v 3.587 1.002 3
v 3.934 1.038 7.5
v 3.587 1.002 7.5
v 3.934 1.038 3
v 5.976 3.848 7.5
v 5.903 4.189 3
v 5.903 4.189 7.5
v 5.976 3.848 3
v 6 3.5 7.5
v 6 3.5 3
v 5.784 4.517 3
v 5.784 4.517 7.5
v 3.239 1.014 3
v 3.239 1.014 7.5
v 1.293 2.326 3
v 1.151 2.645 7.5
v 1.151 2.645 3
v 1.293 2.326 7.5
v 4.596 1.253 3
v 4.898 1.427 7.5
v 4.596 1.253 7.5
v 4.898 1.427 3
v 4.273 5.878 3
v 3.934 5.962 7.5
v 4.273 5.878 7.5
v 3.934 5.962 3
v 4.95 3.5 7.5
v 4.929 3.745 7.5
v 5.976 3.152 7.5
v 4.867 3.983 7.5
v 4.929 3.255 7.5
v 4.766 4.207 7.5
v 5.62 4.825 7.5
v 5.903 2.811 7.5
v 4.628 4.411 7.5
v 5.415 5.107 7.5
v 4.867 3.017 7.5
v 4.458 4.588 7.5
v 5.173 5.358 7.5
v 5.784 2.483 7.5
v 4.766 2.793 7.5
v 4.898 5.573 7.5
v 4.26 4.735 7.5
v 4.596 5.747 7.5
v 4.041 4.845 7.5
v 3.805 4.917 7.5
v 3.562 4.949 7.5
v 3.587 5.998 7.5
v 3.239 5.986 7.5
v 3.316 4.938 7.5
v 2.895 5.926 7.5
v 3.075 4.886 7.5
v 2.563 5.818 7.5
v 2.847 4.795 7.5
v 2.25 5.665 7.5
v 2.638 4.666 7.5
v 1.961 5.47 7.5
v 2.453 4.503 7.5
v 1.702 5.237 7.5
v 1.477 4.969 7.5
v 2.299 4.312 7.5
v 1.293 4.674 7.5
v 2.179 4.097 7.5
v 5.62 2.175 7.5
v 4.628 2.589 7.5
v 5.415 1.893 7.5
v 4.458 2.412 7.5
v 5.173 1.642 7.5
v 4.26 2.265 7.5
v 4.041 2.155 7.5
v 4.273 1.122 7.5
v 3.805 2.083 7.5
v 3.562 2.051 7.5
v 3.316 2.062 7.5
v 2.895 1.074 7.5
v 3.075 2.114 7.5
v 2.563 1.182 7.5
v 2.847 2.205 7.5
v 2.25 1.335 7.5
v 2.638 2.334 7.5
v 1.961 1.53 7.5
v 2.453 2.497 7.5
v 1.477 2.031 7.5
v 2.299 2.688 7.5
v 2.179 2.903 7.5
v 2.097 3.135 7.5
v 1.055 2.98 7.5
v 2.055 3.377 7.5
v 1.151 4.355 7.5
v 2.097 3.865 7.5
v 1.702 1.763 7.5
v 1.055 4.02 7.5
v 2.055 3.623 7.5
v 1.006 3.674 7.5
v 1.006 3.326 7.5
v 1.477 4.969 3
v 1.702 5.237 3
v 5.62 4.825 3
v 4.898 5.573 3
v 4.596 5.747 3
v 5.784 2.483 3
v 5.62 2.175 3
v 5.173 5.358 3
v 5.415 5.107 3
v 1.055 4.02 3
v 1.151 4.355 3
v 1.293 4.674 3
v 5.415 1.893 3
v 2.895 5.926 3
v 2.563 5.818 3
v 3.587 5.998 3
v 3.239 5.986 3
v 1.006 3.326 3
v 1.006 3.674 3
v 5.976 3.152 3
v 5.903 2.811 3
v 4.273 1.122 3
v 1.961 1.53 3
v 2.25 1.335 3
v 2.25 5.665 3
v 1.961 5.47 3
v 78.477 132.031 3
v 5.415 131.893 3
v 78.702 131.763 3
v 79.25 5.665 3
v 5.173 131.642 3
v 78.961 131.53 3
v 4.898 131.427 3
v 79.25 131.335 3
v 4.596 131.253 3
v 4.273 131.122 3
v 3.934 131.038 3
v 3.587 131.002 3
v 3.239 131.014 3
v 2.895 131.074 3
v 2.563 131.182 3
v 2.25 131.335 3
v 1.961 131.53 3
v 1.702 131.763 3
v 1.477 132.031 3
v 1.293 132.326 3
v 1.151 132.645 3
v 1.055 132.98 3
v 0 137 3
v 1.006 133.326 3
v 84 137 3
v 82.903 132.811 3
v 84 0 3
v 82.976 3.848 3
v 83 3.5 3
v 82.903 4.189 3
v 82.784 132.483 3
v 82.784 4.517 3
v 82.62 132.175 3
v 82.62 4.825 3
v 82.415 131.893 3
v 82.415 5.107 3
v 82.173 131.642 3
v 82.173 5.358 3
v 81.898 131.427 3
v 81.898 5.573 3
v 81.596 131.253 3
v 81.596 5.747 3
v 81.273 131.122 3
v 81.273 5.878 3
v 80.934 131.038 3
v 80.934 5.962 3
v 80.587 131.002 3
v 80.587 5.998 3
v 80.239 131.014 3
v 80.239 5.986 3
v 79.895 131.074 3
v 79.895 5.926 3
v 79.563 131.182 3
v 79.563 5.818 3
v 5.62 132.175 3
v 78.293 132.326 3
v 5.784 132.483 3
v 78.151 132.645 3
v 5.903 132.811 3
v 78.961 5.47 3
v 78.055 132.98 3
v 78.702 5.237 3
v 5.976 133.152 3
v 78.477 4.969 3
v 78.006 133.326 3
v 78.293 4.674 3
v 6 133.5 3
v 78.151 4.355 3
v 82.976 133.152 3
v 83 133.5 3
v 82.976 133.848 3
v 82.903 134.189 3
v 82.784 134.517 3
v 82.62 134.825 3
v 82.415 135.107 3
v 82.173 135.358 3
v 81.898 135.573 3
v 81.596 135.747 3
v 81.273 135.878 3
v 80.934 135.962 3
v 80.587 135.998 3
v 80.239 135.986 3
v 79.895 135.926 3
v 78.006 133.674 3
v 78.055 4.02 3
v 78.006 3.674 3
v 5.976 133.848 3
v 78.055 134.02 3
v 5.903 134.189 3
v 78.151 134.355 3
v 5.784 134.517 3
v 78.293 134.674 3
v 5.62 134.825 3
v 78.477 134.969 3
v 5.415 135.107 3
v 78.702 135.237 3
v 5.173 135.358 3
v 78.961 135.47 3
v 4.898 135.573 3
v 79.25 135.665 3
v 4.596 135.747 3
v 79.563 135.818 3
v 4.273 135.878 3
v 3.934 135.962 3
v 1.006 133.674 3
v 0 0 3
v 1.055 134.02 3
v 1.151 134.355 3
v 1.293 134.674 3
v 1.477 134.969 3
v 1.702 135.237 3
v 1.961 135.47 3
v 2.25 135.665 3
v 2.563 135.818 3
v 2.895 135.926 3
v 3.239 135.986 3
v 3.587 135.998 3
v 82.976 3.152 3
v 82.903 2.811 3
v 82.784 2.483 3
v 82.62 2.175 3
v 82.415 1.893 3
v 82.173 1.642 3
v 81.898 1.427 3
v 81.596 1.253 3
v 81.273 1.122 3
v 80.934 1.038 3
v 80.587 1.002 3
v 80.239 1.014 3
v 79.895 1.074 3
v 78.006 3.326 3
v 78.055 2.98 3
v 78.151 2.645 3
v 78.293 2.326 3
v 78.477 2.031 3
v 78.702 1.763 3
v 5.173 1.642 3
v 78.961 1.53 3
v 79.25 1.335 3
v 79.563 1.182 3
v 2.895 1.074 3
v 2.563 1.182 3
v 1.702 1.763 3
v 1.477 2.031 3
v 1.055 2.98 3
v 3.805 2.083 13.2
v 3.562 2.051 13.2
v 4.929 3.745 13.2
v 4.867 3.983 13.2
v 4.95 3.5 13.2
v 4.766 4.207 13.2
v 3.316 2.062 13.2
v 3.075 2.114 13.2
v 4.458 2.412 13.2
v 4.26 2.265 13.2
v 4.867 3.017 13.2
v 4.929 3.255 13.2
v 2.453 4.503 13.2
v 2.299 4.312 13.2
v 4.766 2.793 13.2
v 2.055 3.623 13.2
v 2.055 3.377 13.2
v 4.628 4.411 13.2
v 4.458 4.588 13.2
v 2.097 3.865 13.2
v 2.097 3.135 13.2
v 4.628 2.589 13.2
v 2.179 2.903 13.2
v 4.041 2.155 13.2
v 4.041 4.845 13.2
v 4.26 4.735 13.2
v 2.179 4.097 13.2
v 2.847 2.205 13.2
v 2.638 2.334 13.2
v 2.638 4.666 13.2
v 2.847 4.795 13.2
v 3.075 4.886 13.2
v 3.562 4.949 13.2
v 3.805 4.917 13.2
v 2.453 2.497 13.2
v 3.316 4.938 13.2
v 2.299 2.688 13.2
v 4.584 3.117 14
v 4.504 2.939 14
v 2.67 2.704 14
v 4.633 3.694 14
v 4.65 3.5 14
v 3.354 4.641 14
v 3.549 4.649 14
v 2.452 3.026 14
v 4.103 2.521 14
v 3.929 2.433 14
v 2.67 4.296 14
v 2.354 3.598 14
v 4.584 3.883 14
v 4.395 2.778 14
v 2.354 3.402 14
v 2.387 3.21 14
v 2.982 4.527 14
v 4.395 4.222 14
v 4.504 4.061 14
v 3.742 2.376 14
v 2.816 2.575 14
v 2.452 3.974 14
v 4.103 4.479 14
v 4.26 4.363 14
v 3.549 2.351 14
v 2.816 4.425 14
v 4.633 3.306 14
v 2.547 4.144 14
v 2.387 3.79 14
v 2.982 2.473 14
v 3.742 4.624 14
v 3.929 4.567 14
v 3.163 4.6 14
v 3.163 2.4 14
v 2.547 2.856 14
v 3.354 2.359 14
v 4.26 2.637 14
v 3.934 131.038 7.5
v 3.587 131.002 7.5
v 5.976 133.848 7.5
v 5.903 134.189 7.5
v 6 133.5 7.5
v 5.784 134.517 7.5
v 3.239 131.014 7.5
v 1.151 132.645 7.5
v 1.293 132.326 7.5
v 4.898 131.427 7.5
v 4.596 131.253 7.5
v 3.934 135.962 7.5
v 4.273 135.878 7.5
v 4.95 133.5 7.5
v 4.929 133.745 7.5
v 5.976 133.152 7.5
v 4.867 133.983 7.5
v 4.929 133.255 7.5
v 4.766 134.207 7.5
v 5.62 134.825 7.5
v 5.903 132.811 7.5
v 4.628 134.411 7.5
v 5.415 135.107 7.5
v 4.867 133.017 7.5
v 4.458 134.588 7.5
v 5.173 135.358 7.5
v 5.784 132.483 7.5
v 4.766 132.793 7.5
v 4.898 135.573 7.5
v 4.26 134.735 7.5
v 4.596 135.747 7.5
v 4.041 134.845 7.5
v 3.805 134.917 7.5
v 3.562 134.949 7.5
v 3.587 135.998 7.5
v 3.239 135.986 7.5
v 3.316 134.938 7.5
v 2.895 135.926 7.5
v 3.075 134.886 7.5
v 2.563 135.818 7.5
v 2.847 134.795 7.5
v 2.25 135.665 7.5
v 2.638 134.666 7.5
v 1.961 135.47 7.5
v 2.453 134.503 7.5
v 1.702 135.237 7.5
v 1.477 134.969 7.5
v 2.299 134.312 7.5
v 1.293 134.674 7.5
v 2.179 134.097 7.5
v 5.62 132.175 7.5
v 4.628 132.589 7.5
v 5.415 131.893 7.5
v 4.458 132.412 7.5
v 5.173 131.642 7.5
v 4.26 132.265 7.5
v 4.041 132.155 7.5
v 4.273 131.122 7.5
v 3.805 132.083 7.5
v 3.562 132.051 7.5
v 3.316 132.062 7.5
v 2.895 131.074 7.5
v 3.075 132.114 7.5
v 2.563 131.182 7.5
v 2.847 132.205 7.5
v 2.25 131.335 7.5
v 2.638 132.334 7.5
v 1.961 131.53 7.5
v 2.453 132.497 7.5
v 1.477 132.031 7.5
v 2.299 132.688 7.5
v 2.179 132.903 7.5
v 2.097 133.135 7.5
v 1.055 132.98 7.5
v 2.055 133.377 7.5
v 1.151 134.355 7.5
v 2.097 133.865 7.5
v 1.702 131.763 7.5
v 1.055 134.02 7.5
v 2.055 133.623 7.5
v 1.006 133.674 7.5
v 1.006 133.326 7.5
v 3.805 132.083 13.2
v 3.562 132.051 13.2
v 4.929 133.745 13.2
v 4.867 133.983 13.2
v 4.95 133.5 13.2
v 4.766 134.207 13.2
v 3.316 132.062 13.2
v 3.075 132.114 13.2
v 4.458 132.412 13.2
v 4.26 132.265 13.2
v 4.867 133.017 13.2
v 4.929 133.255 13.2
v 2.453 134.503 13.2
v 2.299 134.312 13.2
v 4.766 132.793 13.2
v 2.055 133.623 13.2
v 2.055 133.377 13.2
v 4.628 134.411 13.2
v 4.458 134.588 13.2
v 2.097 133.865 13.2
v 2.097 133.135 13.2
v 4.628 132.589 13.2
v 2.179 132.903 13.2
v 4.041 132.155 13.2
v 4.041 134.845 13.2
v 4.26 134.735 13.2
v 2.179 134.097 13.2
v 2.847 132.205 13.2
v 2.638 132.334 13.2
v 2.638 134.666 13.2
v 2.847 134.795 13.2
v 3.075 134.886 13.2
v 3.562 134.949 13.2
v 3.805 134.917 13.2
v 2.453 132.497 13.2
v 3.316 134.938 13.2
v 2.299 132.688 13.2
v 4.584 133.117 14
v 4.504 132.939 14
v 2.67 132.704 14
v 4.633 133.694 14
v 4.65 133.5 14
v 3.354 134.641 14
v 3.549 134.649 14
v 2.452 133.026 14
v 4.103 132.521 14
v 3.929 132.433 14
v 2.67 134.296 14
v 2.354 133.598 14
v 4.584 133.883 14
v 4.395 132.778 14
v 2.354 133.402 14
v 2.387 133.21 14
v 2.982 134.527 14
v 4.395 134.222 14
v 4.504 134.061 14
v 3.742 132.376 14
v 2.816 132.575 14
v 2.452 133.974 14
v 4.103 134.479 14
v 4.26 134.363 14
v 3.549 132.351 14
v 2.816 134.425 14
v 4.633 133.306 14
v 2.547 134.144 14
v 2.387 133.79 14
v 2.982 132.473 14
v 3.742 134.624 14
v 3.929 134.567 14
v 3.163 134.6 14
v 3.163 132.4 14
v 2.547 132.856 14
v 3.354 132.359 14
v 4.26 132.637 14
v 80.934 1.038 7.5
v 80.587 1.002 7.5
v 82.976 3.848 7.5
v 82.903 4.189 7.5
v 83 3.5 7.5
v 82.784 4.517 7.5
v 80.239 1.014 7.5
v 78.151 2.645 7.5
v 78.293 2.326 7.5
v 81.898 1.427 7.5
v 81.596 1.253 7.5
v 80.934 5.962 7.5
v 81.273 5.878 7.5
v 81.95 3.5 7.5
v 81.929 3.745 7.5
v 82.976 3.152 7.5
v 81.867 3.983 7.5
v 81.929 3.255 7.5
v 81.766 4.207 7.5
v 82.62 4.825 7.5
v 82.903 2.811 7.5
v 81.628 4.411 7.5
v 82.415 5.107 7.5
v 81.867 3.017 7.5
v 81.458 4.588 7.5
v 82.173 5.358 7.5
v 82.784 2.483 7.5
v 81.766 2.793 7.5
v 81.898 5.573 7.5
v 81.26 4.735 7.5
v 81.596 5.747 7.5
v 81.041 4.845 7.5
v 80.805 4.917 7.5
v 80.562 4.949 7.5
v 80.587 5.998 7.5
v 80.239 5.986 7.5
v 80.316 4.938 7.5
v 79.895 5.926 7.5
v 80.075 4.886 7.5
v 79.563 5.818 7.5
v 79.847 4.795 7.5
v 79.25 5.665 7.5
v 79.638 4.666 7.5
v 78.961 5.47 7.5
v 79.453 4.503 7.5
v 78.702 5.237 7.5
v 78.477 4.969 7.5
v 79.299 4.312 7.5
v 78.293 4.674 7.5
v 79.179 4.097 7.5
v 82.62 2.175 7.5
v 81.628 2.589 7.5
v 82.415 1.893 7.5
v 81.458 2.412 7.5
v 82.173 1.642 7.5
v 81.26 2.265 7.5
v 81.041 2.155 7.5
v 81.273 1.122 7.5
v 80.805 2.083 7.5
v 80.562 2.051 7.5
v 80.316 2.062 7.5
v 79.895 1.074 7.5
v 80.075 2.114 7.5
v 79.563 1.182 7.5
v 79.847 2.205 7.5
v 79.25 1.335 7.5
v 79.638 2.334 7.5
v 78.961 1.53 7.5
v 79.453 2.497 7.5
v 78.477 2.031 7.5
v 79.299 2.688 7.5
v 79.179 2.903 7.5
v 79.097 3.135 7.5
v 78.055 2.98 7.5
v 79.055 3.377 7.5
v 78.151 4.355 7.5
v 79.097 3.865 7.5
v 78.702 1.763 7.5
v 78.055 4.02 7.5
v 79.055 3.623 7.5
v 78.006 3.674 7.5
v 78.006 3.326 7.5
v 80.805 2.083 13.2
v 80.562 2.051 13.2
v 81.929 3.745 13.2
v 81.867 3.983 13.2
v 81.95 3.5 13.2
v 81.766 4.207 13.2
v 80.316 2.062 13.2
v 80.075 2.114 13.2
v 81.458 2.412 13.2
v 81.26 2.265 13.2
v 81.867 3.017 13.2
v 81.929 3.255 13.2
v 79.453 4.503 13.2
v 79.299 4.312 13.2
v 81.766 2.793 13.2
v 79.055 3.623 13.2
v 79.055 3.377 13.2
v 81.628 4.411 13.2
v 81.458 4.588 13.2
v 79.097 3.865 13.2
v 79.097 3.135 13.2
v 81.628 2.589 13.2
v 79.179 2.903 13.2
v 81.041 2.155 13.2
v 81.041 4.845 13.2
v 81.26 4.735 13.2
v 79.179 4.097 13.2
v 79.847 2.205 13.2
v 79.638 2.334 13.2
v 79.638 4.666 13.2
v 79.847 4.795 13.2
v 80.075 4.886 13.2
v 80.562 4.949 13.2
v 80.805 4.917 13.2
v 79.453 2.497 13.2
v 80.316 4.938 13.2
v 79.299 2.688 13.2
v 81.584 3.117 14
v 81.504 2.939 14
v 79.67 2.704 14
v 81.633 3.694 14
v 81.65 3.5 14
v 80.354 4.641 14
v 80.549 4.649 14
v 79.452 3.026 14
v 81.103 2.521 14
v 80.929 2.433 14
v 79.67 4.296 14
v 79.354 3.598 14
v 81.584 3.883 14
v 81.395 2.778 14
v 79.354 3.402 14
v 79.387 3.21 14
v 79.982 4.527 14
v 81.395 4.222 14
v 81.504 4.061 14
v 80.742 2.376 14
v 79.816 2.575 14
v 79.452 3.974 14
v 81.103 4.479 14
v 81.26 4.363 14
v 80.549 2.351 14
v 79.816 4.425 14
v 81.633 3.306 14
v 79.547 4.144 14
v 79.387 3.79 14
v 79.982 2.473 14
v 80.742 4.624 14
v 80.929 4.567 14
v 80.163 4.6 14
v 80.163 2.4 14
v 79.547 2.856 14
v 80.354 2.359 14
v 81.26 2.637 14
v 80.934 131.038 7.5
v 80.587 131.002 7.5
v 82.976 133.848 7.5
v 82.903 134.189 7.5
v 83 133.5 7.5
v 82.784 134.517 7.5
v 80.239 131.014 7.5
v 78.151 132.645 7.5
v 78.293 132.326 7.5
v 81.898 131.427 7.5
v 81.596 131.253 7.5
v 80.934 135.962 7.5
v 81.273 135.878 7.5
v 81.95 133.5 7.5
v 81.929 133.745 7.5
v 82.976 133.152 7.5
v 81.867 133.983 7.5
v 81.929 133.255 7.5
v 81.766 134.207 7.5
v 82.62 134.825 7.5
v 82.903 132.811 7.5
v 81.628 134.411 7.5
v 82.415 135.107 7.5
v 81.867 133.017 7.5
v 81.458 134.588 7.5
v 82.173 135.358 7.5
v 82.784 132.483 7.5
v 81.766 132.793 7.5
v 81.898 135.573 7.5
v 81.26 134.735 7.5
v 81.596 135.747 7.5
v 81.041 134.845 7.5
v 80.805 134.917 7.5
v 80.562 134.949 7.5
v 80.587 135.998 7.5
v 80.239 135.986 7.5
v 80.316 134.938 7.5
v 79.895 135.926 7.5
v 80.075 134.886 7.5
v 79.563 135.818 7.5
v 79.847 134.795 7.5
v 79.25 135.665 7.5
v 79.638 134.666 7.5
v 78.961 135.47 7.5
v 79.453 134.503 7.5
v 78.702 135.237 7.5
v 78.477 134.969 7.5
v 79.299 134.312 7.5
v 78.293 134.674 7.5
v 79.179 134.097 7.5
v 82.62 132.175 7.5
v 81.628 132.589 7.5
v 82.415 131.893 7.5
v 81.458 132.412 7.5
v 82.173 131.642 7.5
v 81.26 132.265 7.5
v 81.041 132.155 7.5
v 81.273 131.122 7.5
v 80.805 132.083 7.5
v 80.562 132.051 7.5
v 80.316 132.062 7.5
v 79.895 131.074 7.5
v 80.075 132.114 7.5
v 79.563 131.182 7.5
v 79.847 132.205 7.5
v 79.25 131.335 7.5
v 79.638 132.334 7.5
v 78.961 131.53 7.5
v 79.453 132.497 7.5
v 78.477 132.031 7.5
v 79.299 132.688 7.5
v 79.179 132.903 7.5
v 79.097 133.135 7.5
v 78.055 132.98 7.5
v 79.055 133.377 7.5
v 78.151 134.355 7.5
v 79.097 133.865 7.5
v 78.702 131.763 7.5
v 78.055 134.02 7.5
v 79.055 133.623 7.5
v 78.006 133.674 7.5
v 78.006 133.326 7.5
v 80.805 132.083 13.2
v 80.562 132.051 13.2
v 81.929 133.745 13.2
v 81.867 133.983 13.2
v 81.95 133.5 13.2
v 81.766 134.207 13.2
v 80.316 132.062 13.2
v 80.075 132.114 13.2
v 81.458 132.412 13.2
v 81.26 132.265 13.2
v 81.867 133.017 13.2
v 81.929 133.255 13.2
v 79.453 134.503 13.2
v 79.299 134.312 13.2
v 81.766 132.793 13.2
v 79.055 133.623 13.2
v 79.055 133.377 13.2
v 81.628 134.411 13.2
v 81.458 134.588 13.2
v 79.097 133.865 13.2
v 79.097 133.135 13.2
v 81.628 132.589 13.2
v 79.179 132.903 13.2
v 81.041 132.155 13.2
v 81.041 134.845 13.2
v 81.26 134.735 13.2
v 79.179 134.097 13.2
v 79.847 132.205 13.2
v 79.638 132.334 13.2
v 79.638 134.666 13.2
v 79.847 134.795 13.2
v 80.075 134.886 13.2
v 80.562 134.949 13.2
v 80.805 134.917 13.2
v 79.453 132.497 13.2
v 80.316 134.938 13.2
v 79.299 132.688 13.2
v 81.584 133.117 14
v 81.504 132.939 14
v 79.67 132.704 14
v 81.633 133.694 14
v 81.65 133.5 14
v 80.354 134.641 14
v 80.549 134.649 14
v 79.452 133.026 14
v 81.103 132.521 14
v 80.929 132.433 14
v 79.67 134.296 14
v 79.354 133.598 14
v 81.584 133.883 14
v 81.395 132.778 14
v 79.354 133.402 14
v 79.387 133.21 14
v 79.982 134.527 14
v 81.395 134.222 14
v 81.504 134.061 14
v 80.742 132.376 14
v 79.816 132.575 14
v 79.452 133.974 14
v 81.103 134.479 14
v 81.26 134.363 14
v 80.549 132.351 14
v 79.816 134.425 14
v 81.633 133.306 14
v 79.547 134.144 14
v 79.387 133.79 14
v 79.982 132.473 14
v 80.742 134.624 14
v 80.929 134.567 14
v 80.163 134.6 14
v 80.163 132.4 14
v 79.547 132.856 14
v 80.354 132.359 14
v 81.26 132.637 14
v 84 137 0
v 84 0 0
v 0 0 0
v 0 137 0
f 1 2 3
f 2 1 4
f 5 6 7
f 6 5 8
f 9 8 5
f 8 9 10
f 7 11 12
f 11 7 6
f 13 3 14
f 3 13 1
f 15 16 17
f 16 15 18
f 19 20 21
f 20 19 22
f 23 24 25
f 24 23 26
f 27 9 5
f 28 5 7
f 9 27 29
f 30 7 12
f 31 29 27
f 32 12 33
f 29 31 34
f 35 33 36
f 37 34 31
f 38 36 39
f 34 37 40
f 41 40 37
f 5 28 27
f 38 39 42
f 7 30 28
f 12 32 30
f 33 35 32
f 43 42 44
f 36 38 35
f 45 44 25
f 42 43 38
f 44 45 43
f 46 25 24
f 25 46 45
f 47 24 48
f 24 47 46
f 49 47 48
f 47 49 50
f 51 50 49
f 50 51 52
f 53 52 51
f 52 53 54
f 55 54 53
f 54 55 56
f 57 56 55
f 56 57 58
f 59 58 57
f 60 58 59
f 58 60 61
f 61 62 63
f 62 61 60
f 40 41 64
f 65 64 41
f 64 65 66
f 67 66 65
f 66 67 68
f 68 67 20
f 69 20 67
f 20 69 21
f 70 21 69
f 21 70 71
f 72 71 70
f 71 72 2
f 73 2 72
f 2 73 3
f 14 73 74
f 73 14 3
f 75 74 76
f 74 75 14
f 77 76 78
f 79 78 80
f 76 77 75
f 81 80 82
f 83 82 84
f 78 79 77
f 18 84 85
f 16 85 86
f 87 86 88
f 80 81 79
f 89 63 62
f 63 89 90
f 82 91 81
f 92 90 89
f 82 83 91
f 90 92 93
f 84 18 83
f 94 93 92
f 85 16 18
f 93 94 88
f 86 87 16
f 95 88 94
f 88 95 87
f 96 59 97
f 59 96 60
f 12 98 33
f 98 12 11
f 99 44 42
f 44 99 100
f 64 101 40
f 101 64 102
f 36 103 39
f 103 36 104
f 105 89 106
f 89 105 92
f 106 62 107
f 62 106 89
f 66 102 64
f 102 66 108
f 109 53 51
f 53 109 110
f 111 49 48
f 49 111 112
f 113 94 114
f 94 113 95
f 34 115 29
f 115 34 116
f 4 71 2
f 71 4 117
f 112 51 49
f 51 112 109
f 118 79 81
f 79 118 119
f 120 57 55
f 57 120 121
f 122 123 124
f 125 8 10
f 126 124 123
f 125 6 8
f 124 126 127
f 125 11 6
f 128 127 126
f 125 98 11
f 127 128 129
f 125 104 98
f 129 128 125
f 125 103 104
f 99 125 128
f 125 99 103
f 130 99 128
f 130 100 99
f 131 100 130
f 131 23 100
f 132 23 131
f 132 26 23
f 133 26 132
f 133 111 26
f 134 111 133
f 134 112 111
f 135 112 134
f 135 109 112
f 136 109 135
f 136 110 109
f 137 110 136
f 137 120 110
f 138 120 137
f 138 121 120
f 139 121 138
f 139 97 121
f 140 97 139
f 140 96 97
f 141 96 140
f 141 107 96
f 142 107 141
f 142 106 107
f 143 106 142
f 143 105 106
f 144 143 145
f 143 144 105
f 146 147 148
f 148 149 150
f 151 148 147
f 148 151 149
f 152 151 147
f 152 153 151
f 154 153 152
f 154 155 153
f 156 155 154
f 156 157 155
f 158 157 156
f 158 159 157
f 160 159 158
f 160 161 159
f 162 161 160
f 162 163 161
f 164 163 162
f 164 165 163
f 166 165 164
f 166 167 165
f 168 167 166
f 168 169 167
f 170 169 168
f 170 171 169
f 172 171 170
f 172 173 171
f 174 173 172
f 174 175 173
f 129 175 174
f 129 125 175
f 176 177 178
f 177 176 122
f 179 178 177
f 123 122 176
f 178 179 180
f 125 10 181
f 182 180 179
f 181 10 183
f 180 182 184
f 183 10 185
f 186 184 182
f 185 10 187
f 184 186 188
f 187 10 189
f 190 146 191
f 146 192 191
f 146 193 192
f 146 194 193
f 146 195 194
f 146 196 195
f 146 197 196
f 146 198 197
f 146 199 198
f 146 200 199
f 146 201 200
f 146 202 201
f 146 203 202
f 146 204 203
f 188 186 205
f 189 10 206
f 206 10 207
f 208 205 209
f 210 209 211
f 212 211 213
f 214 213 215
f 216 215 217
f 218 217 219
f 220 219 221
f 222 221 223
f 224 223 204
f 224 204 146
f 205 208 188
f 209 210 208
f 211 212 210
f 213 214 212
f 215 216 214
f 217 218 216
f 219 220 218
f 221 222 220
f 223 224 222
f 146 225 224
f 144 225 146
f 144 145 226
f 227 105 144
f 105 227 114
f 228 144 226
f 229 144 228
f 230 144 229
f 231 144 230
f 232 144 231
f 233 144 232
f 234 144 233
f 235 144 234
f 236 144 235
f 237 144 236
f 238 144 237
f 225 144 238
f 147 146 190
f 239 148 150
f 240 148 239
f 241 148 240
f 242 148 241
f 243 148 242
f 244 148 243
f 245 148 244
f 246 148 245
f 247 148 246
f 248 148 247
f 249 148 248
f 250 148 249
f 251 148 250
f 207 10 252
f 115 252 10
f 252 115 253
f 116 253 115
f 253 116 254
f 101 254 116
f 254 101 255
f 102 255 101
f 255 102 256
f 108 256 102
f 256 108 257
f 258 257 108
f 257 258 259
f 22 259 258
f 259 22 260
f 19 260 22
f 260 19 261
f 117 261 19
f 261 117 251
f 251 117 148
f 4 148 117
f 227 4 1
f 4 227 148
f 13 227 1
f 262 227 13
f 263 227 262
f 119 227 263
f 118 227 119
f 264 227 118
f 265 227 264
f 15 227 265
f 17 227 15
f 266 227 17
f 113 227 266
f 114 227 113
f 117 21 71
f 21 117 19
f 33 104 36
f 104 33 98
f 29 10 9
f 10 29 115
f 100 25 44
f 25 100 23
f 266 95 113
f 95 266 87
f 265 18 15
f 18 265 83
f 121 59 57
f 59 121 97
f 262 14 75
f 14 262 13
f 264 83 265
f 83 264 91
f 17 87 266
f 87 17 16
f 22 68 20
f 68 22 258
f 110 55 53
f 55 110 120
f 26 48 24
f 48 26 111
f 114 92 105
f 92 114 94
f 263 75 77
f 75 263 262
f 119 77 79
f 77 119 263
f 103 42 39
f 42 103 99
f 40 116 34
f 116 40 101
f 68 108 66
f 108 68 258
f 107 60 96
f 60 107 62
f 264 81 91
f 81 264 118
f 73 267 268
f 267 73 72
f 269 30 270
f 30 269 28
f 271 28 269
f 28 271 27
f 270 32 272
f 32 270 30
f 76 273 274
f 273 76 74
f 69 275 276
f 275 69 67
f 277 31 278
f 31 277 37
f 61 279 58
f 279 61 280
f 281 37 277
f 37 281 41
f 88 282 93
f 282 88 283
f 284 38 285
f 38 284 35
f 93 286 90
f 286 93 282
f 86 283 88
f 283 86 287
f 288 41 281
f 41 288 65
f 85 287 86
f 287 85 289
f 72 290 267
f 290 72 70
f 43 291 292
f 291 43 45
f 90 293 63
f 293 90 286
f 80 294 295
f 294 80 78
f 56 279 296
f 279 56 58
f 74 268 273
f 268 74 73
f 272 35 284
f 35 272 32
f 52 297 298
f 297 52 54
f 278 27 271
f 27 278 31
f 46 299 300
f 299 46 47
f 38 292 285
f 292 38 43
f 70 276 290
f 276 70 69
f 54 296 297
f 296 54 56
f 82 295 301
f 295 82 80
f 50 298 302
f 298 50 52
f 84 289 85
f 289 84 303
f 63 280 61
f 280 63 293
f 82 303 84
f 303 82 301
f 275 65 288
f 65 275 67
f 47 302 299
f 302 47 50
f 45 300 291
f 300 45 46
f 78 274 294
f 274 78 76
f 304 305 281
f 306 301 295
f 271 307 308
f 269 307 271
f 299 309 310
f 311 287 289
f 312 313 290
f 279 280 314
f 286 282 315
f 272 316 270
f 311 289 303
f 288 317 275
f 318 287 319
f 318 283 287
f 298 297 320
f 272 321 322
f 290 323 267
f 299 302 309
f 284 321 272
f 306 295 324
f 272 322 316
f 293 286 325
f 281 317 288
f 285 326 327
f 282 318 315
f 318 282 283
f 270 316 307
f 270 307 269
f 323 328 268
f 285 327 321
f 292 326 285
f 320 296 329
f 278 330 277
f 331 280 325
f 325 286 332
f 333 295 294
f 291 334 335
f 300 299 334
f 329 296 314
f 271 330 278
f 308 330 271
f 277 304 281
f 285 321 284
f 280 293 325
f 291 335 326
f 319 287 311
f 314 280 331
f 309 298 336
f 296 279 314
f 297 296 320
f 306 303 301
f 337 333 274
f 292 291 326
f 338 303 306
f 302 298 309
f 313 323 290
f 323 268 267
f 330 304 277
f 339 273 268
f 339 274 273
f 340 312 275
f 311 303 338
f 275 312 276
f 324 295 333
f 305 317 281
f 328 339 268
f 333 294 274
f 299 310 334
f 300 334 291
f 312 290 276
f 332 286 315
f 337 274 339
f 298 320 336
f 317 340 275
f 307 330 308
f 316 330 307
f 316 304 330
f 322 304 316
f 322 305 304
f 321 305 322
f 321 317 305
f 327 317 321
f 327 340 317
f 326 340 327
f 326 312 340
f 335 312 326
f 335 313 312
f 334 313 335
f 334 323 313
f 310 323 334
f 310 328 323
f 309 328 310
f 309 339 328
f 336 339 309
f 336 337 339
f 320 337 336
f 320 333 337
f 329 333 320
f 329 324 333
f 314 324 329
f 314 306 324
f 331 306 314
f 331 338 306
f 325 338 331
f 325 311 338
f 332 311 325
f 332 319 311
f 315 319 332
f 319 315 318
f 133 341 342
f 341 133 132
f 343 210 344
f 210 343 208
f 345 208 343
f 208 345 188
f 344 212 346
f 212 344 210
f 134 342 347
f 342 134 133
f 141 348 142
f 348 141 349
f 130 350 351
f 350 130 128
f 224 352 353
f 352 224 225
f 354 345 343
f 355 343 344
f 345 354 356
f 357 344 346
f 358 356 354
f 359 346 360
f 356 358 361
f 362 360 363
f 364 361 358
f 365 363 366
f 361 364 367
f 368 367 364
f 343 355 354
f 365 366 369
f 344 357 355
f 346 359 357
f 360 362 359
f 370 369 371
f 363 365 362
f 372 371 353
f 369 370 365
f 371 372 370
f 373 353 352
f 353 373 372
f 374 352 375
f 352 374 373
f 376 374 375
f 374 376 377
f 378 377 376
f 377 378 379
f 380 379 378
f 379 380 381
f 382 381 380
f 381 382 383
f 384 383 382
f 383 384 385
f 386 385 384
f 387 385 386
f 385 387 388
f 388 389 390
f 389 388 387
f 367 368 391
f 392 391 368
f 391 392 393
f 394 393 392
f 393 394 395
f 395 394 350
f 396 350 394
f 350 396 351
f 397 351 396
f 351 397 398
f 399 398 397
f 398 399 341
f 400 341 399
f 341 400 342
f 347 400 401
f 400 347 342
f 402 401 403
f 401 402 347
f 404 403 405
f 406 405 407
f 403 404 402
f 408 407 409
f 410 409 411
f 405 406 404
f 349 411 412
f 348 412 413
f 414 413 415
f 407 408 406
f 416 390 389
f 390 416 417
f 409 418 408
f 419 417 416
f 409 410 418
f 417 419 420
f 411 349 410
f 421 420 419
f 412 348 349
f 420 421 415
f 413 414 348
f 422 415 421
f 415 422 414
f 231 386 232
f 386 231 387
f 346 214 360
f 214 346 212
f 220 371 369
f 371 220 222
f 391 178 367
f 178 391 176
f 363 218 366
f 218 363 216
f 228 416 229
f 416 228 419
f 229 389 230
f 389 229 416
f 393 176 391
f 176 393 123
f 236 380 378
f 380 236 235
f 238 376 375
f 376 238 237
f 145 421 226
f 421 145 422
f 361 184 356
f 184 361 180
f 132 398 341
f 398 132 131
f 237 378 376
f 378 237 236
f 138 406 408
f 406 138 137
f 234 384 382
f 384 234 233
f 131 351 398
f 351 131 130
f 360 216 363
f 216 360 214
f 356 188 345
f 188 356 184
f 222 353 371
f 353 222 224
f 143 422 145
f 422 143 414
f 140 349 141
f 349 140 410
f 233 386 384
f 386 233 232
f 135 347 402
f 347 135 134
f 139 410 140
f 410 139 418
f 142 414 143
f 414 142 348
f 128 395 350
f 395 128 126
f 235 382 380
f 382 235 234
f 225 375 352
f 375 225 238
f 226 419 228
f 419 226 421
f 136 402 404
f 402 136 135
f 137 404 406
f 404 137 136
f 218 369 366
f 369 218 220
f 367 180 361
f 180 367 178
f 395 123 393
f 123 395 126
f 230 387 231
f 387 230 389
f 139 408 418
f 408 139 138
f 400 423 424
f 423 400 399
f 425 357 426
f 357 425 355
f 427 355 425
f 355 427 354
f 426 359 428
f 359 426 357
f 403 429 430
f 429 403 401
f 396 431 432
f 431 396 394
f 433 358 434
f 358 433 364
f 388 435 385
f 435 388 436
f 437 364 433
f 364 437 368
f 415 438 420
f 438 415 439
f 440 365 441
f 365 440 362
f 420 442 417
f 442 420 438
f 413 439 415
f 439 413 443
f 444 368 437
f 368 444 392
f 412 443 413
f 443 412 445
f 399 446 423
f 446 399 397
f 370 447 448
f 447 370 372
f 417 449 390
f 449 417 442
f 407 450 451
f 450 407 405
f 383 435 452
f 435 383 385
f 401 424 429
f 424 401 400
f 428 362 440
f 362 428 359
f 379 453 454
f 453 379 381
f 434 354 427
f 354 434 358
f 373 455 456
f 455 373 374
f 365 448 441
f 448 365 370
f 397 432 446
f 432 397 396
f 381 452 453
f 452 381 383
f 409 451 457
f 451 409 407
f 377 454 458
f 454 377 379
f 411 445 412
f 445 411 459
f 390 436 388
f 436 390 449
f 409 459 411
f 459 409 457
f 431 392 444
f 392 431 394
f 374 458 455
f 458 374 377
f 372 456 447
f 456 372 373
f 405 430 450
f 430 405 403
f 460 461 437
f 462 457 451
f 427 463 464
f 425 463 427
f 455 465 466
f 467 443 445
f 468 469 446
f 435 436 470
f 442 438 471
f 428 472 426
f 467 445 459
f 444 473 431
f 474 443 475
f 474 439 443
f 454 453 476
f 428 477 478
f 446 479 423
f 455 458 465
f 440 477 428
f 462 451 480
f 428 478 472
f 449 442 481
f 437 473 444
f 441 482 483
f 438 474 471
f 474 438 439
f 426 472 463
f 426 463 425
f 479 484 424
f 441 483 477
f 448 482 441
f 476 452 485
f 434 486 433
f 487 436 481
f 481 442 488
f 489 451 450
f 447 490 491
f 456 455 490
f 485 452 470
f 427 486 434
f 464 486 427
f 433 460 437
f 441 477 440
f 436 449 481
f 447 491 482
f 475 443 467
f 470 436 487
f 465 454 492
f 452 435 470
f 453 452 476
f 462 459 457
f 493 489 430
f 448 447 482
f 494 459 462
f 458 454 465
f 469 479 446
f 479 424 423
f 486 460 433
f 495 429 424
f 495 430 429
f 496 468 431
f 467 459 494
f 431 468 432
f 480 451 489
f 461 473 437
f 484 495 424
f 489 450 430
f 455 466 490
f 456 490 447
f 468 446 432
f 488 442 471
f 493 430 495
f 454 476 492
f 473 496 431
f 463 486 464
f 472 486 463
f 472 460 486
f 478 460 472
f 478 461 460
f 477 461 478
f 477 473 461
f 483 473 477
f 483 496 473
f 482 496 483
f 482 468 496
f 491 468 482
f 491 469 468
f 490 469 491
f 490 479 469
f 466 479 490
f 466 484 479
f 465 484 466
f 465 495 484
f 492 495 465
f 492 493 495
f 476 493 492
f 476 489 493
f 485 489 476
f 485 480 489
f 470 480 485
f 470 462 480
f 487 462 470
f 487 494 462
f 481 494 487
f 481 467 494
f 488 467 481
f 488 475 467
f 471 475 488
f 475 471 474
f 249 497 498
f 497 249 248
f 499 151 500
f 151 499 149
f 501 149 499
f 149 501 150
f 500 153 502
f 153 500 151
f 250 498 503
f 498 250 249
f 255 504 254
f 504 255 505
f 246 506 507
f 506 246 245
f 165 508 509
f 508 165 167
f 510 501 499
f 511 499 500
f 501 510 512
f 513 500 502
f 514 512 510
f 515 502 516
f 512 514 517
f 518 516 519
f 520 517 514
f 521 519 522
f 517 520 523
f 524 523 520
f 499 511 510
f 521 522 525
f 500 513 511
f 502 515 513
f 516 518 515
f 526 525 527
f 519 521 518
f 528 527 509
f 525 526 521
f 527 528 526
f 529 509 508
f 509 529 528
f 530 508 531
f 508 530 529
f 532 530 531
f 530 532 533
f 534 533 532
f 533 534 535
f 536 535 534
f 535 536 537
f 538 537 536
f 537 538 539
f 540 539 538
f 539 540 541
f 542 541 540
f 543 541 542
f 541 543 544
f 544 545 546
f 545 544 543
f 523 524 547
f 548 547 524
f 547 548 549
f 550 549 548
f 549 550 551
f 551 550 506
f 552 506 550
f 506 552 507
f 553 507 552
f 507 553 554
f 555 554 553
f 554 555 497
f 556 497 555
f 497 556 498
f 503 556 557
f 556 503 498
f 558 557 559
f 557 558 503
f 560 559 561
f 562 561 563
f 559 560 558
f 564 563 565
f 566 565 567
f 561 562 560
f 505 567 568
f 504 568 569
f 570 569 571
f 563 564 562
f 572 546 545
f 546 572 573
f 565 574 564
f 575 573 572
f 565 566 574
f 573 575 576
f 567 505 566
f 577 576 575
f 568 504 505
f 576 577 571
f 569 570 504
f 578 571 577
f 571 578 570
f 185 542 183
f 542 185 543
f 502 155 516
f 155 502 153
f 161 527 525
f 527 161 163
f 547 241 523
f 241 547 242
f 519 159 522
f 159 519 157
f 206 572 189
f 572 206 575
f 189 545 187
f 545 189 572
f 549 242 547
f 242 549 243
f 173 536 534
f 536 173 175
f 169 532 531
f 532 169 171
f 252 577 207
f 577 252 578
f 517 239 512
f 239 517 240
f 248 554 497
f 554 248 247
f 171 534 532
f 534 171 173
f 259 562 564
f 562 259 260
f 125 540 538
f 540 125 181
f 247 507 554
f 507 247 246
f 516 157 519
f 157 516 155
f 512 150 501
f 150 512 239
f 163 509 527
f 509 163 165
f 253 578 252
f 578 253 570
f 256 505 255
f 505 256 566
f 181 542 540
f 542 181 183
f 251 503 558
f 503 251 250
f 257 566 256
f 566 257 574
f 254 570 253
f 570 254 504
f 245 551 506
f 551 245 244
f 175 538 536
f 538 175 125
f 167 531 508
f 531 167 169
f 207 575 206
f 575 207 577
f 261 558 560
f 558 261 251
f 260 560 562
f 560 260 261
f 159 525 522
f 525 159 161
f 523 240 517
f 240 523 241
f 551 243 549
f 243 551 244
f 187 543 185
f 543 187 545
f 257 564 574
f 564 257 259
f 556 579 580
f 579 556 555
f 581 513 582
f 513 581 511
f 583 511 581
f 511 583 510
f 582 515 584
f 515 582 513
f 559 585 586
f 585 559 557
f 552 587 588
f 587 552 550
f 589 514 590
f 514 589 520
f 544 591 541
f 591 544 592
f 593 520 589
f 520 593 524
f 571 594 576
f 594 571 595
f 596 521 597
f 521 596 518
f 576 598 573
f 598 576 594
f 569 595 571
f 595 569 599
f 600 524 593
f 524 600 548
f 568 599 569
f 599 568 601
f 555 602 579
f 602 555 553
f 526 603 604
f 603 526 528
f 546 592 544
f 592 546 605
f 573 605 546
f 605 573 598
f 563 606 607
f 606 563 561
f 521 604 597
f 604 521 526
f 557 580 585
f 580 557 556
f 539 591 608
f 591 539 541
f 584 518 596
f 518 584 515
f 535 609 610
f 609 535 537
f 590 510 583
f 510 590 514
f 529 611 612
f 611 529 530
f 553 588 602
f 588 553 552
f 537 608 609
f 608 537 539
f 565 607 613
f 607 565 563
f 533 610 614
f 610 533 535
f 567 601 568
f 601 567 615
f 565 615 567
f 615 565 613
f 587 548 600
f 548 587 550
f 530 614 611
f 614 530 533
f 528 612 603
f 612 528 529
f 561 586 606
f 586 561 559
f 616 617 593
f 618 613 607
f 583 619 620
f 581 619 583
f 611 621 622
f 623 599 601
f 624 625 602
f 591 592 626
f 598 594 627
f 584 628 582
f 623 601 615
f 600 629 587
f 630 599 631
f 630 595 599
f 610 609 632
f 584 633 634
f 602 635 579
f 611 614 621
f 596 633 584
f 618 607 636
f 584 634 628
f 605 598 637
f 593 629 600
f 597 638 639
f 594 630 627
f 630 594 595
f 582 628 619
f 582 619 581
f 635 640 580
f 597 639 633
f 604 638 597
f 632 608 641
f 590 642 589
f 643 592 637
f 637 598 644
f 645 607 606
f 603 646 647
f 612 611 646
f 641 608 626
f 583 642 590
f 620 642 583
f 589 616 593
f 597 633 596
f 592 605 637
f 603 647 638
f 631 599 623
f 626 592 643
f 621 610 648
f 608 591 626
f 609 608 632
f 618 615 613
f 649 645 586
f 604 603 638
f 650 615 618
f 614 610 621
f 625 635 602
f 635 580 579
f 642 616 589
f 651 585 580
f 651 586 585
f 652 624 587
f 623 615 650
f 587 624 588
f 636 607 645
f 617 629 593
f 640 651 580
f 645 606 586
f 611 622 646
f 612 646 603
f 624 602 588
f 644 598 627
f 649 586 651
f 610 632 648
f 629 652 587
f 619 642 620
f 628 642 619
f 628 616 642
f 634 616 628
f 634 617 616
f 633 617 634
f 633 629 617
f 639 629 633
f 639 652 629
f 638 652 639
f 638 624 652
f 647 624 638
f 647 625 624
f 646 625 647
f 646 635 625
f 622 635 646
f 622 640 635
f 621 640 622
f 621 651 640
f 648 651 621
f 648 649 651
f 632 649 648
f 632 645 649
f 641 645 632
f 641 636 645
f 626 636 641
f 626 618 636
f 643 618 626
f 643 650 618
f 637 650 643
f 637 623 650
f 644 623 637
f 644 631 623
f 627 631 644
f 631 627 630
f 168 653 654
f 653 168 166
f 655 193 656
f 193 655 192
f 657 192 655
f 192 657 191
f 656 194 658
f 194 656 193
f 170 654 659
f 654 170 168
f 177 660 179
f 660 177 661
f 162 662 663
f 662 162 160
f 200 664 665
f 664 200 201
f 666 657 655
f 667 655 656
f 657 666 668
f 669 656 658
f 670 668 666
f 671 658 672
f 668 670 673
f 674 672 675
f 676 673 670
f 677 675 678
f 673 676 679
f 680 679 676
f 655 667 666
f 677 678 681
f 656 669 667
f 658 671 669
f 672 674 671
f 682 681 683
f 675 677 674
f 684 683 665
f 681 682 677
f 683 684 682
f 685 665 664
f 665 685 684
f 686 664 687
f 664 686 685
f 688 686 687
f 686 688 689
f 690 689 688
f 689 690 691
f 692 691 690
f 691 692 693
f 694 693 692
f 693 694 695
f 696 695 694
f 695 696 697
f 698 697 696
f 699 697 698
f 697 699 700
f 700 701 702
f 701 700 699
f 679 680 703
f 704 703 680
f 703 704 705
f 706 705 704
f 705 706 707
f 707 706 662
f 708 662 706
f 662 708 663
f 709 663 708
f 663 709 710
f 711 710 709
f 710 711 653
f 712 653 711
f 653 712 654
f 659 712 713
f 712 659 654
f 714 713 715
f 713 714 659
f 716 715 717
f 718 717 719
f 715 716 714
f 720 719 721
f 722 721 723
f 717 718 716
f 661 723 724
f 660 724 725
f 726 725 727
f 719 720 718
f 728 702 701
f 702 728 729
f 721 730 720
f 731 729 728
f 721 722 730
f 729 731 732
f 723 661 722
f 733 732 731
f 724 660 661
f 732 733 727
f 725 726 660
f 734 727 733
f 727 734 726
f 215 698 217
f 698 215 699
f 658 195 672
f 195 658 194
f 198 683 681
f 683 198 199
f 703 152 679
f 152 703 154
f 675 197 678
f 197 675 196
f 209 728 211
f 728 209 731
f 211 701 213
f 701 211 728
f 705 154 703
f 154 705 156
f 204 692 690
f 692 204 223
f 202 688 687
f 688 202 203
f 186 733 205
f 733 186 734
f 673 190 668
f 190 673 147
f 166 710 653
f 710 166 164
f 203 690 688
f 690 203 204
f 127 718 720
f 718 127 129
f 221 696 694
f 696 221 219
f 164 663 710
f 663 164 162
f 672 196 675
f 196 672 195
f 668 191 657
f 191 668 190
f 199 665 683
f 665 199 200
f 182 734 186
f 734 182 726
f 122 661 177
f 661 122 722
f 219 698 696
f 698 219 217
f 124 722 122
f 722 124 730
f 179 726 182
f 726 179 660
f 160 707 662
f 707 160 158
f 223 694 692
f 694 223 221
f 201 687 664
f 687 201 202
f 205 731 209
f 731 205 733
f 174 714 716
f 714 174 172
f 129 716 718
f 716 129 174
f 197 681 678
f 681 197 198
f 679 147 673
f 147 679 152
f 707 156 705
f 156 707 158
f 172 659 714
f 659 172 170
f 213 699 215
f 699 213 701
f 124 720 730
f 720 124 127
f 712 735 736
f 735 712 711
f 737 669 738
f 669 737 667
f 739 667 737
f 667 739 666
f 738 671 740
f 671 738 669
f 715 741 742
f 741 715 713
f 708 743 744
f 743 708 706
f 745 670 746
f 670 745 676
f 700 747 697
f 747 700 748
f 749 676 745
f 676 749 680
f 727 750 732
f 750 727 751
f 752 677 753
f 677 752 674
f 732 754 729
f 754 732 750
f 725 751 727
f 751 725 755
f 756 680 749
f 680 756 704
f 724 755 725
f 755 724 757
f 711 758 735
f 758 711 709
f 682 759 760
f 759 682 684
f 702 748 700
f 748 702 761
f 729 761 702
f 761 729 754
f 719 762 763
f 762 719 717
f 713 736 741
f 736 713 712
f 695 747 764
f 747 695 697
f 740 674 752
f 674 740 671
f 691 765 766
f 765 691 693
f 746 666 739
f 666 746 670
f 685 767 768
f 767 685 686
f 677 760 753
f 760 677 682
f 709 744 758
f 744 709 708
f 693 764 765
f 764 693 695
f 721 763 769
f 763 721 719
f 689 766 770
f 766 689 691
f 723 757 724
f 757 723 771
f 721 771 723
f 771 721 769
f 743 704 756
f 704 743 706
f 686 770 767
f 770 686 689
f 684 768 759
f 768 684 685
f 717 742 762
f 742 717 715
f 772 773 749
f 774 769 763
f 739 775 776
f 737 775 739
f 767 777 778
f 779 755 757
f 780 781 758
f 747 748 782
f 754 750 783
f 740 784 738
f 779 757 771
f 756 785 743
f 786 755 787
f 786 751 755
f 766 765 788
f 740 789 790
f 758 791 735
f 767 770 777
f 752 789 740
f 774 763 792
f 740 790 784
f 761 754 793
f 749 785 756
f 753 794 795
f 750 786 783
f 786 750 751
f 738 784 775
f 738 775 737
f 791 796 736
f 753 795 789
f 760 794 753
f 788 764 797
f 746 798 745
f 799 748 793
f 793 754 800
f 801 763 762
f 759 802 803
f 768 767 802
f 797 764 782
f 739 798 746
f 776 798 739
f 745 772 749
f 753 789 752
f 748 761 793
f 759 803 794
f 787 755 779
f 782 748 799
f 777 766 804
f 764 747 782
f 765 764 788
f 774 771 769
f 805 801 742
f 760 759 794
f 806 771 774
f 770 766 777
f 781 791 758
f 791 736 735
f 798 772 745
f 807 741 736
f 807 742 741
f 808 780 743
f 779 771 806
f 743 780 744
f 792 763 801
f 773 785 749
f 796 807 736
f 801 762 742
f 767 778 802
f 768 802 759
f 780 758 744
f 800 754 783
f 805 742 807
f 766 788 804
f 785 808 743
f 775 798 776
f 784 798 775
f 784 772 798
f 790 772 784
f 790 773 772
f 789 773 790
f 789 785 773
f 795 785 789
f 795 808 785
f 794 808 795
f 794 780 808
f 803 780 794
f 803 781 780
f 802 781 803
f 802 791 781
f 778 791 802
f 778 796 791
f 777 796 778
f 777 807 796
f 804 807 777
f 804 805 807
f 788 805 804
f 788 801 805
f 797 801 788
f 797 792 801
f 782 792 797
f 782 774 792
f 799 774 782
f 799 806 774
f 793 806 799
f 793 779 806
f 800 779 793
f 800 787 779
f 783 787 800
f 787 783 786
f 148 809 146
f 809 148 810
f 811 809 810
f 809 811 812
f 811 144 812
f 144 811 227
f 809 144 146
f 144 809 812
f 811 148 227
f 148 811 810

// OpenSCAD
// OpenSCAD: две детали — основание со стойками и штырями, и рамка с окном под экран
// Версия: v1.7 — анизотропная фаска снизу: независимые размеры по Z и по горизонтали (X/Y);
// добавлен режим тест‑фрагментов и echo-контроль полей до кромки.
// добавлен режим тест‑фрагментов и echo-контроль полей до кромки.

// ===== Точность аппроксимации окружностей =====
$v = "1.7"; // Версия модели
$fn = 0;        // фикс. сегментация отключена
$fa = 6;        // макс. угол сегмента, град
$fs = 0.35;     // макс. длина сегмента, мм (≈диаметр сопла)
pin_fs = 0.25;  // чуть тоньше для штырей и отверстий

// ===== Режим печати тест‑фрагментов =====
test_fragment = false;   // true — печатать только угловые фрагменты (base+frame)
frag_size     = 20;     // размер квадрата вырезки, мм
frag_index    = 0;      // 0=НЛ, 1=ВЛ, 2=НП, 3=ВП (относительно основания)
frag_gap_x    = 10;     // зазор между фрагментами по X, мм
frag_h_extra  = 20;     // запас по высоте клипа, мм

// Фрагменты модели:
// - base: основание с стойками и штырями
// - frame: рамка с окном под экран
// - base_top_pad: верхняя площадка основания (если потребуется)
// - base_wrap_left / base_wrap_right: возможные боковые обвязки (резерв)
// - frame_top_pad / frame_base_pad: элементы рамки (резерв)
// - test fragments: 4 угла основания/рамки для быстрой проверки посадки
//   индексы углов: 0=Нижний Левый, 1=Верхний Левый, 2=Нижний Правый, 3=Верхний Правый

// ===== Выбор печатаемых деталей =====
print_base  = true;     // печатать основание
print_frame = false;     // печатать рамку

// ===== Общие доп. параметры =====
tiny = 0.1;                  // небольшой зазор для булевых операций
edge_chamfer_z = 4;       // высота фаски по Z (мм) - убрана фаска
edge_chamfer_x = 1.6;       // горизонтальный вылет фаски по X (с каждой стороны), мм - убрана фаска
edge_chamfer_y = 1.6;       // горизонтальный вылет фаски по Y (с каждой стороны), мм - убрана фаска
screen_frame_gap = 0.2;      // только для высоты вычитаний в рамке (не влияет на XY)

// ===== Параметры платы и экрана =====
board_width  = 84;           // ширина платы (X), мм
board_height = 137;          // высота платы (Y), мм
board_thickness = 1.5;       // толщина платы, мм

screen_width  = 75.5;        // ширина (горизонталь, X) экрана, мм
screen_height = 120;         // высота (вертикаль, Y) экрана, мм
 
// ===== Габариты основания/рамки =====
base_margin_x = 0;           // отступы к габариту НЕ используются — внешние размеры = board_width/board_height
base_margin_y = 0;           // внешняя ширина = board_width
base_thickness = 3;          // толщина основания, мм
base_edge_multiplier = 0;     // 

frame_thickness = 5;         // толщина рамки, мм
window_clearance_x = 0.5;      // припуск (каждая сторона) к окну под экран, мм
window_clearance_y = 0.8;

// ===== Параметры крепёжных отверстий, стоек и штырей =====
hole_spacing_x = 75;      // расстояние между отверстиями по X, мм
hole_spacing_y = 129;         // расстояние между отверстиями по Y, мм
hole_diameter_board = 3;     // диаметр отверстий в плате (под винт/штырь), мм
hole_edge_tweak_x = 1;   // на сколько ближе к краям по X
hole_edge_tweak_y = 0.5;   // на сколько ближе к краям по Y

standoff_outer_diam = 5;     // диаметр стоек (опора под плату), мм
standoff_height = 4.5;       // высота стоек до низа платы, мм

pin_extra = frame_thickness; // сколько штырь выступает над платой, мм (по умолч. = толщине рамки)
pin_diam  = hole_diameter_board - 0.1; // диаметр штыря = отверстие платы −0.1 мм
pin_tip_h = 0.8;             // конус-направляющая на конце штыря (0 — выключить)

// ===== Вычисляемые величины (общие для base и frame) =====
base_width  = board_width;     // внешние габариты деталей (X) строго равны размерам платы
base_height = board_height;    // внешние габариты деталей (Y) строго равны размерам платы

// Отступы отверстий от краёв детали (симметричные) + сдвиг к краю на 1 мм
edge_x = max(0, (base_width  - hole_spacing_x)/2 - hole_edge_tweak_x);
edge_y = max(0, (base_height - hole_spacing_y)/2 - hole_edge_tweak_y);

// Позиции центров отверстий (общие для base и frame)
hole_positions = [
    [edge_x,                 edge_y                ], // нижний левый
    [edge_x,                 base_height - edge_y  ], // верхний левый
    [base_width  - edge_x,   edge_y                ], // нижний правый
    [base_width  - edge_x,   base_height - edge_y  ]  // верхний правый
];

// Проверочный вывод одинаковости полей (должны совпадать попарно)
left_margin   = hole_positions[0][0];
right_margin  = base_width - hole_positions[2][0];
bottom_margin = hole_positions[0][1];
top_margin    = base_height - hole_positions[1][1];
echo("Margins to edges (L,R,B,T):", left_margin, right_margin, bottom_margin, top_margin);

// Размер окна под экран (сквозное)
open_width = screen_width + 2*window_clearance_y; // X
open_height = screen_height  + 2*window_clearance_x; // Y
open_off_x = (base_width  - open_width)/2;   // одинаково для base и frame (X)
open_off_y = (base_height - open_height)/2;   // (Y)

// ===== Вспомогательное =====
function clamp(val, lo, hi) = max(lo, min(val, hi));
function clamp_chz(t, chz) = clamp(chz, 0, t/2);
function clamp_chxy(l,w,chx,chy) = [clamp(chx, 0, l/2 - tiny), clamp(chy, 0, w/2 - tiny)];

// Пластина с фаской ТОЛЬКО СНИЗУ по внешнему периметру (симметрично по всем сторонам)
module chamfered_plate_bottom_edges_sym(l,w,t,chz,chx,chy){
    chz2 = clamp_chz(t, chz);
    chxy = clamp_chxy(l, w, chx, chy);
    chx2 = chxy[0];
    chy2 = chxy[1];
    if (chz2 <= 0 || (chx2 <= 0 && chy2 <= 0)) {
        cube([l,w,t]);
    } else {
        union(){
            translate([0,0,chz2]) cube([l,w,t-chz2]); // тело
            // нижняя фаска: масштабируем ИЗ ЦЕНТРА на требуемые горизонтальные вылеты
            translate([l/2, w/2, 0])
                linear_extrude(height=chz2, scale=[l/(l-2*chx2), w/(w-2*chy2)])
                    square([l-2*chx2, w-2*chy2], center=true);
        }
    }
}

// ===== Детали =====
module basePlate(){
    // Основание
    color("lightgray") chamfered_plate_bottom_edges_sym(base_width, base_height, base_thickness, edge_chamfer_z*base_edge_multiplier, edge_chamfer_x*base_edge_multiplier, edge_chamfer_y*base_edge_multiplier);

    // Стойки + штыри
    for (pos = hole_positions){
        translate([pos[0], pos[1], base_thickness])
            cylinder(h=standoff_height, d=standoff_outer_diam);
        translate([pos[0], pos[1], base_thickness + standoff_height])
            cylinder(h=board_thickness + pin_extra - (pin_tip_h>0?pin_tip_h:0), d=pin_diam, $fs=pin_fs, $fa=$fa);
        if (pin_tip_h > 0)
            translate([pos[0], pos[1], base_thickness + standoff_height + board_thickness + pin_extra - pin_tip_h])
                cylinder(h=pin_tip_h, d1=pin_diam, d2=max(pin_diam-0.6,0.5), $fs=pin_fs, $fa=$fa);
    }
}

module screenFrame(){
    // Рамка
    difference(){
        color("silver") chamfered_plate_bottom_edges_sym(base_width, base_height, frame_thickness, edge_chamfer_z, edge_chamfer_x, edge_chamfer_y);
        // окно под экран (сквозное). ВЫСОТА с учётом screen_frame_gap, НО XY не трогаем
        translate([open_off_x, open_off_y, -tiny])
            cube([open_width, open_height, frame_thickness + screen_frame_gap + 2*tiny]);
        // отверстия под штыри
        for (pos = hole_positions)
            translate([pos[0], pos[1], -tiny])
                cylinder(h=frame_thickness + screen_frame_gap + 2*tiny, d=pin_diam + 0.2, $fs=pin_fs, $fa=$fa);
    }
}

// ===== Вывод на сцену =====
pos = hole_positions[frag_index];

if (test_fragment) {
    if (print_base) {
        // Фрагмент основания
        intersection() {
            basePlate();
            translate([pos[0] - frag_size/2, pos[1] - frag_size/2, -1])
                cube([frag_size, frag_size, base_thickness + standoff_height + board_thickness + pin_extra + frag_h_extra]);
        }
    }
    if (print_frame) {
        // Фрагмент рамки — справа
        intersection() {
            translate([frag_size + frag_gap_x, 0, 0]) screenFrame();
            translate([pos[0] - frag_size/2 + frag_size + frag_gap_x, pos[1] - frag_size/2, -1])
                cube([frag_size, frag_size, frame_thickness + screen_frame_gap + frag_h_extra]);
        }
    }
} else {
    if (print_base) basePlate();
    if (print_frame) translate([0, base_height + 10, 0]) screenFrame();
}
